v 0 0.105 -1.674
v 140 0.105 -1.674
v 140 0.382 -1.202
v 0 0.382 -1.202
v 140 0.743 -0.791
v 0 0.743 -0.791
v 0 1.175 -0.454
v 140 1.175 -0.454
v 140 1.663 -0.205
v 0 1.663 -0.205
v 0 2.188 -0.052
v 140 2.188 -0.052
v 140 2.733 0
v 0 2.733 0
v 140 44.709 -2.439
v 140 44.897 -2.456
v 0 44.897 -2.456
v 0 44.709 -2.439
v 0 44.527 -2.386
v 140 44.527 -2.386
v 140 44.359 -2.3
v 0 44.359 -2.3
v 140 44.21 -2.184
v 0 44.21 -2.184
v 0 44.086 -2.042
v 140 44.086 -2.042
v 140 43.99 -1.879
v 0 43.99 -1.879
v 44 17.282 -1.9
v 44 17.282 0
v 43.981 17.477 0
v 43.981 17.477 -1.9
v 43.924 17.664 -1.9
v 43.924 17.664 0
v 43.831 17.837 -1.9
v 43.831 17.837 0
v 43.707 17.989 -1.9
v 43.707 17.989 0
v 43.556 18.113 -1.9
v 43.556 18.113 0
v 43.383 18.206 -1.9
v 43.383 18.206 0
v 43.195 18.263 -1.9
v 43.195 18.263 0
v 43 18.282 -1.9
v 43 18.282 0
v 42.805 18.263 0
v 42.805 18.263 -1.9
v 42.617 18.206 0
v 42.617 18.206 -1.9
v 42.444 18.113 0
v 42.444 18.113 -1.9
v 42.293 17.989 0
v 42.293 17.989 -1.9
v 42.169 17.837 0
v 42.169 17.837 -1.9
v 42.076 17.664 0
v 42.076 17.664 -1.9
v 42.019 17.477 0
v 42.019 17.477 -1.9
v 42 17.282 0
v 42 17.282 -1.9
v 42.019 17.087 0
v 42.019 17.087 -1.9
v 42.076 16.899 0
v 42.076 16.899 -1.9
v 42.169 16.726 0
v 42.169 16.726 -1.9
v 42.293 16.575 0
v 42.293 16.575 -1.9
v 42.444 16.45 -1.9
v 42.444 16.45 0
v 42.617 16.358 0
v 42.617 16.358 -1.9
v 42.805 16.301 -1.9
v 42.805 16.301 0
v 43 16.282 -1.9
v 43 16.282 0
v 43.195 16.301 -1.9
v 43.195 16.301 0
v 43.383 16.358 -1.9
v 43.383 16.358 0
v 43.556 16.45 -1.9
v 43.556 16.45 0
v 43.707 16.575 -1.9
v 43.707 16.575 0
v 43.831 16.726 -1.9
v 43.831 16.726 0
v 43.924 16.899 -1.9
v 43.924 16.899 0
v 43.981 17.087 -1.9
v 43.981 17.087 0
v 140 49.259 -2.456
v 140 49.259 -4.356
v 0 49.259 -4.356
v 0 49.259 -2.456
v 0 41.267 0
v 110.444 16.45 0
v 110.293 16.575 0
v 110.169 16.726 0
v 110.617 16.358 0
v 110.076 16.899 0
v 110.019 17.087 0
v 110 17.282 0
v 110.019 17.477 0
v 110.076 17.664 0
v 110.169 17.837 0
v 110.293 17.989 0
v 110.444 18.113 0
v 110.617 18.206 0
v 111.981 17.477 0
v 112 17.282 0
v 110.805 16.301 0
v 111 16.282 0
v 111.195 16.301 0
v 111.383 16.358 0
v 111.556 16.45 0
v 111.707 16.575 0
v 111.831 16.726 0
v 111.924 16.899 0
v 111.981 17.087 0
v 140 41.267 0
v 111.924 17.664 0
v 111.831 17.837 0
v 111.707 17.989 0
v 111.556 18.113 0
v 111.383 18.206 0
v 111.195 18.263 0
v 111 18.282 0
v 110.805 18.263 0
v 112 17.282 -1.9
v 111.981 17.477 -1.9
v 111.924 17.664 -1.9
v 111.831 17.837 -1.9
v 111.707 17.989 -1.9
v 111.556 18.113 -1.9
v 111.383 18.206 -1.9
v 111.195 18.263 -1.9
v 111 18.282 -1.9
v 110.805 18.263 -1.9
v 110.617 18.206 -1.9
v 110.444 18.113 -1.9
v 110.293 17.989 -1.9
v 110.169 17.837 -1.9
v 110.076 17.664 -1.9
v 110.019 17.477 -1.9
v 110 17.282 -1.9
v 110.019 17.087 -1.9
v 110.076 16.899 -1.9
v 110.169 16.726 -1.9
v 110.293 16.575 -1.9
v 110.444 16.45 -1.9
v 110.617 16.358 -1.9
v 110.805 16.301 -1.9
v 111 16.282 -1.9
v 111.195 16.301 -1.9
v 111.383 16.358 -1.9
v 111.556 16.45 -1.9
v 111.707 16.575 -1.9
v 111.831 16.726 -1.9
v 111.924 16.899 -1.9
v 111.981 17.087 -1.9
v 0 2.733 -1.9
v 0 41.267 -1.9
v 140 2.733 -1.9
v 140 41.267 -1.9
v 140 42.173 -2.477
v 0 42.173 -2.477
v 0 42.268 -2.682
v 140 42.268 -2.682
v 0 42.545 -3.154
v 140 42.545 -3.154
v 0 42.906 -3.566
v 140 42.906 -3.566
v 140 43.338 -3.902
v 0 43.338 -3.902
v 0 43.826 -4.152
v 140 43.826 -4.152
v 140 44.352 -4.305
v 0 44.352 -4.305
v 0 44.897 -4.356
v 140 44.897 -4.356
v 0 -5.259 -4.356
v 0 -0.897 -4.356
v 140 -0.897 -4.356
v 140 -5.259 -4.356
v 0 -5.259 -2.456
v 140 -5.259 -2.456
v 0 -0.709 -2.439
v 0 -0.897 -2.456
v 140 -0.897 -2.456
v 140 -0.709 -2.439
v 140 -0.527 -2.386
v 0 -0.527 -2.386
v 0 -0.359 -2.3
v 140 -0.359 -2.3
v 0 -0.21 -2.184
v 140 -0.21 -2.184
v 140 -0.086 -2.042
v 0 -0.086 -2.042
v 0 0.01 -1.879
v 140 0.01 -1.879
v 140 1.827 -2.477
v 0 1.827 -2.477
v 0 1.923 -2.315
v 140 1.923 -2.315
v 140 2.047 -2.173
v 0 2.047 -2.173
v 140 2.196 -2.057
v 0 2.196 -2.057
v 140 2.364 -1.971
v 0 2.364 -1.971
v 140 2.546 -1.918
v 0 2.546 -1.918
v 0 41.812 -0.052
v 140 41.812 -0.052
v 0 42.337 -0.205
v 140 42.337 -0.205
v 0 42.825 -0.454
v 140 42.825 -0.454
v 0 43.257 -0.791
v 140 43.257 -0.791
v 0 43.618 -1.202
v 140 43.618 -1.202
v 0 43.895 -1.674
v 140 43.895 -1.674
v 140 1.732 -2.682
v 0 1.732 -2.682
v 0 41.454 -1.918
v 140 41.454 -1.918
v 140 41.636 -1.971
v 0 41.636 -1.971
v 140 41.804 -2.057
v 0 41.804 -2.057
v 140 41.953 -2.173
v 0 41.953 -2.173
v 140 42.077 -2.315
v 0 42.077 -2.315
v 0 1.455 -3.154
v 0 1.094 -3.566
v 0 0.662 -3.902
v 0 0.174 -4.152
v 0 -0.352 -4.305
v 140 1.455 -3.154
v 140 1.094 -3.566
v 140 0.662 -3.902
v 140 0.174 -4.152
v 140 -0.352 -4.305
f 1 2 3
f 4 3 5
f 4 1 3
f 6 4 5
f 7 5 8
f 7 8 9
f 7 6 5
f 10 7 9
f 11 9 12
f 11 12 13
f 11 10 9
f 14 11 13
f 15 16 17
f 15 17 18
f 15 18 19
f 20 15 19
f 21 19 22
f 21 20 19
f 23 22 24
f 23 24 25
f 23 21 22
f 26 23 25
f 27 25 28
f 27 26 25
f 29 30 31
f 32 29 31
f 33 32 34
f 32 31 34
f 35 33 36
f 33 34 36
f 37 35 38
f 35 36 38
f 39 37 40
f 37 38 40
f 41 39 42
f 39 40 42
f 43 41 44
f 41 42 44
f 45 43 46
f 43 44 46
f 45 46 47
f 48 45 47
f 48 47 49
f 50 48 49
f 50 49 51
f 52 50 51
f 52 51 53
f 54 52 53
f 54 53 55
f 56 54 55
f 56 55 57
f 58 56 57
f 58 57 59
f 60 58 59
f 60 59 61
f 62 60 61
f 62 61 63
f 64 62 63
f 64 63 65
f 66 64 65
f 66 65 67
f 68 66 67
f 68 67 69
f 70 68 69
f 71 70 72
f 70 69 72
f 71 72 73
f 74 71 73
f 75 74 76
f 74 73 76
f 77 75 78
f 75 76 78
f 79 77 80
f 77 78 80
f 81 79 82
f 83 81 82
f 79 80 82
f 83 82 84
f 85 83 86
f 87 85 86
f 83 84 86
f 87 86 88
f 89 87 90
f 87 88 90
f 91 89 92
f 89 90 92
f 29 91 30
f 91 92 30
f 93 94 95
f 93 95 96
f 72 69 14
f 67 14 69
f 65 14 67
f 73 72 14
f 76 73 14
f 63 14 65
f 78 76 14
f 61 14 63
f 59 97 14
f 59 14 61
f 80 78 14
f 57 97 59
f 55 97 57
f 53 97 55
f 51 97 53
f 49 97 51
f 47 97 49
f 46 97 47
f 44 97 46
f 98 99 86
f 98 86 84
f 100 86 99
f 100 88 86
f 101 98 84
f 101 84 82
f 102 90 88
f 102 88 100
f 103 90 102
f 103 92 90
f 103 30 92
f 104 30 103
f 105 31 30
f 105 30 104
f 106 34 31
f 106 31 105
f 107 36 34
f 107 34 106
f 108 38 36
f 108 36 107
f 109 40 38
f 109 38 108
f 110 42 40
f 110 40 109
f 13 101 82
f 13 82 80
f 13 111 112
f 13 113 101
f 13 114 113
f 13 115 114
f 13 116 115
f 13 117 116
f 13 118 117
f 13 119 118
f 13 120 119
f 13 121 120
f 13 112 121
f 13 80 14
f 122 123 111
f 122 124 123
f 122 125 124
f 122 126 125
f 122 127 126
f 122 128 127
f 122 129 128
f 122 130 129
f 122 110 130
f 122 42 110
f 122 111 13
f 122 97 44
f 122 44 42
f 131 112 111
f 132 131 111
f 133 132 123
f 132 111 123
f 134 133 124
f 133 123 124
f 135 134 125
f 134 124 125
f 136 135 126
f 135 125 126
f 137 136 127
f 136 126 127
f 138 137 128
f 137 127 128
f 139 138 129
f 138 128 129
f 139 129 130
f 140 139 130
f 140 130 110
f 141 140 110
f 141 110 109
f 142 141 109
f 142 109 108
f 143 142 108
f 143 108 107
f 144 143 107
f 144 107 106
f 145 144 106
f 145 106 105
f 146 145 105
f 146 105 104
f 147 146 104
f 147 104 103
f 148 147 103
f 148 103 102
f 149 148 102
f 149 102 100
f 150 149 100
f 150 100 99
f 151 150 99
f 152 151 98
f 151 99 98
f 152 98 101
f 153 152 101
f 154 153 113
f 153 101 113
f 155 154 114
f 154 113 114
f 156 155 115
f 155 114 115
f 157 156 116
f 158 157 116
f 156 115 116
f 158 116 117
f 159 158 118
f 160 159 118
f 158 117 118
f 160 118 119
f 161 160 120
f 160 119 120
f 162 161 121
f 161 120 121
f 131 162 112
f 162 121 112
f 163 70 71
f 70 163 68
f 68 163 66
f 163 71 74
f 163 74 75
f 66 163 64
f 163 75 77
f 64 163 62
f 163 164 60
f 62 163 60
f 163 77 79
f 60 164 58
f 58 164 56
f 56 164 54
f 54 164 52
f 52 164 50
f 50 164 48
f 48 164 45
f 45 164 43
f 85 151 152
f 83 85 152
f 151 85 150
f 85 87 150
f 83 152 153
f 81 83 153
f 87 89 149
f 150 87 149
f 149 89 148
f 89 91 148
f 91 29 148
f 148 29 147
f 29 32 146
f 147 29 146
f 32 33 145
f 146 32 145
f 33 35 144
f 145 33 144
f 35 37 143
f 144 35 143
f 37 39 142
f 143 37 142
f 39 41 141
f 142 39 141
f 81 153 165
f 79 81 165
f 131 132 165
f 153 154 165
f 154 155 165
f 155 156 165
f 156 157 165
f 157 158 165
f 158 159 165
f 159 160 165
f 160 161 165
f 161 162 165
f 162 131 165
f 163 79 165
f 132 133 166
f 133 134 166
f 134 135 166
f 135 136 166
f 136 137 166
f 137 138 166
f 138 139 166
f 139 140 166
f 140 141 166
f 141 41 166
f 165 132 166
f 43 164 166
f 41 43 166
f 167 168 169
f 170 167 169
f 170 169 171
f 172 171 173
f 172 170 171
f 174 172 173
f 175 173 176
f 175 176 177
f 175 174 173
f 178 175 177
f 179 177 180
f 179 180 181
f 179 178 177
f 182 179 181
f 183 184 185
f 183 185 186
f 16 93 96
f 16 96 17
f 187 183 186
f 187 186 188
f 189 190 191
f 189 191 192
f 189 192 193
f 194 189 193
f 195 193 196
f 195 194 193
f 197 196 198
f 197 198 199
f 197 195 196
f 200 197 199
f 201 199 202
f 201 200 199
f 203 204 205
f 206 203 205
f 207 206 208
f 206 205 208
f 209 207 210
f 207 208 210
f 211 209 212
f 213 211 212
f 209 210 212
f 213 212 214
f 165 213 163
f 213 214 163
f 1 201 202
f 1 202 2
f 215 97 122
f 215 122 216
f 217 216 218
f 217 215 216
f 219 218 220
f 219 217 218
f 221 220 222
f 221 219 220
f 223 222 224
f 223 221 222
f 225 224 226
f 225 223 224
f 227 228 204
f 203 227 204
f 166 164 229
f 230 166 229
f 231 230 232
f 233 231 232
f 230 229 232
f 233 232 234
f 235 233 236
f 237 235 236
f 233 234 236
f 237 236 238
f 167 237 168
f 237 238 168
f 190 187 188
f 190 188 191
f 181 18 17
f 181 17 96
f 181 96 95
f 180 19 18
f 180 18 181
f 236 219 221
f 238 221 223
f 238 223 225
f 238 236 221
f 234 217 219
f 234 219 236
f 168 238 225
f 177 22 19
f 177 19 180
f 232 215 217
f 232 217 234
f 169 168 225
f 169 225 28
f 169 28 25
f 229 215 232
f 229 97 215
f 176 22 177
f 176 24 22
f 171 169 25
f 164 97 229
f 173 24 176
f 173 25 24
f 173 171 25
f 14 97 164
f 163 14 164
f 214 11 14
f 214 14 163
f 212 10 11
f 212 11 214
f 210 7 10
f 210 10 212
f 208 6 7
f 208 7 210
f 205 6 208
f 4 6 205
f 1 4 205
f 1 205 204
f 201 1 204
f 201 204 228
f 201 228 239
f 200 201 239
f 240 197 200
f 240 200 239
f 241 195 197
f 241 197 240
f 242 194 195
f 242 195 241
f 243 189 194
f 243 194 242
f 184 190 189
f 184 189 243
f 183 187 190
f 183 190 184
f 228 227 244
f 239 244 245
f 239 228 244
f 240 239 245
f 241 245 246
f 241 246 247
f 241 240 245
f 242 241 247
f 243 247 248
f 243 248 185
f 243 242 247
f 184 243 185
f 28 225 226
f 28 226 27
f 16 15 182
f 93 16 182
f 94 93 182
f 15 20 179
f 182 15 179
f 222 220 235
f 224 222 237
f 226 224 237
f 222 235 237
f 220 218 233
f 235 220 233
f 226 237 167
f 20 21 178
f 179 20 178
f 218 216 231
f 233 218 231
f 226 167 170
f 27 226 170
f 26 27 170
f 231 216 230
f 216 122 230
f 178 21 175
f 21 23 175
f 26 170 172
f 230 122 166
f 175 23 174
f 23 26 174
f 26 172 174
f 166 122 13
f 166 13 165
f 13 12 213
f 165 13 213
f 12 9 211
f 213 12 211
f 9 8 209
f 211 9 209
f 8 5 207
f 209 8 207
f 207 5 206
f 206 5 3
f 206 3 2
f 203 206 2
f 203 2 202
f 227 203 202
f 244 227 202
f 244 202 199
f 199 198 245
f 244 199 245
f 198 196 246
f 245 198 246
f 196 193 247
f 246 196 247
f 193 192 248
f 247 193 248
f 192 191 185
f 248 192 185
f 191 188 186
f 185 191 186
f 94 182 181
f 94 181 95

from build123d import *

# Parameters (mm, degrees)
SKETCH1_W                      = 140
SKETCH1_H                      = 44
BASE_FLANGE1_DEPTH             = 1.9
EDGE_FLANGE1_DEPTH             = 140
EDGE_FLANGE1_2_DEPTH           = 140
EDGE_FLANGE2_STRIP_CUT_DEPTH   = 140
EDGE_FLANGE2_STRIP_CUT_2_DEPTH = 140
EDGE_FLANGE2_DEPTH             = 140
EDGE_FLANGE2_BEND_DEPTH        = 140
SKETCH40_R                     = 1
CUT_EXTRUDE1_DEPTH             = 5


# Read off the part's stored shape, not the designer's step: Edge-Flange1
# Sheet-metal steps are written as plain solids
with BuildPart() as part:
    # Sketch1 → Base-Flange1 (new body)
    with BuildSketch(Plane.XY):
        with Locations((70, 22)):
            Rectangle(SKETCH1_W, SKETCH1_H)
    extrude(amount=-BASE_FLANGE1_DEPTH)

    # Edge-Flange1 outline → Edge-Flange1 (cut)
    with BuildSketch(Plane.YZ):
        with BuildLine():
            ThreePointArc((41.266511693, 0), (42.824680557, -0.454164807), (43.894804276, -1.674407041))
            Line((43.894804276, -1.674407041), (44, -1.9))
            Line((44, -1.9), (44, 0))
            Line((44, 0), (41.266511693, 0))
        make_face()
        with BuildLine():
            ThreePointArc((0.105195724, -1.674407041), (1.175319443, -0.454164807), (2.733488307, 0))
            Line((2.733488307, 0), (0, 0))
            Line((0, 0), (0, -1.9))
            Line((0, -1.9), (0.105195724, -1.674407041))
        make_face()
    extrude(amount=EDGE_FLANGE1_DEPTH, mode=Mode.SUBTRACT)

    # Edge-Flange1 2 outline → Edge-Flange1 2 (add)
    with BuildSketch(Plane.YZ):
        with BuildLine():
            Line((44.259494142, -2.456486983), (44, -1.9))
            Line((44, -1.9), (41.266511693, -1.9))
            ThreePointArc((41.266511693, -1.9), (41.803811302, -2.056608554), (42.17281948, -2.477381738))
            Line((42.17281948, -2.477381738), (42.537509347, -3.259461681))
            Line((42.537509347, -3.259461681), (44.259494142, -2.456486983))
        make_face()
        with BuildLine():
            ThreePointArc((1.82718052, -2.477381738), (2.196188698, -2.056608554), (2.733488307, -1.9))
            Line((2.733488307, -1.9), (0, -1.9))
            Line((0, -1.9), (-0.259494142, -2.456486983))
            Line((-0.259494142, -2.456486983), (1.462490653, -3.259461681))
            Line((1.462490653, -3.259461681), (1.82718052, -2.477381738))
        make_face()
    extrude(amount=EDGE_FLANGE1_2_DEPTH)

    # Edge-Flange2 strip (across the edge) → Edge-Flange2 strip cut (cut)
    with BuildSketch(Plane(origin=(140, 44.259494142, -2.456486983), x_dir=(0, 0, 1), z_dir=(-1, 0, 0))):
        Polygon((-8.926147715, 2.065912991), (-0.225592959, -1.991222322), (0.577381738, -0.269237526), (-8.123173017, 3.787897786), align=None)
    extrude(amount=EDGE_FLANGE2_STRIP_CUT_DEPTH, mode=Mode.SUBTRACT)

    # Edge-Flange2 strip 2 (across the edge) → Edge-Flange2 strip cut 2 (cut)
    with BuildSketch(Plane(origin=(0, -0.259494142, -2.456486983), x_dir=(0, 0, 1), z_dir=(1, 0, 0))):
        Polygon((-8.926147715, 2.065912991), (-0.225592959, -1.991222322), (0.577381738, -0.269237526), (-8.123173017, 3.787897786), align=None)
    extrude(amount=EDGE_FLANGE2_STRIP_CUT_2_DEPTH, mode=Mode.SUBTRACT)

    # Edge-Flange2 section (across the edge) → Edge-Flange2 (add)
    with BuildSketch(Plane(origin=(140, 44.259494142, -2.456486983), x_dir=(0, 0, 1), z_dir=(-1, 0, 0))):
        with BuildLine():
            Line((-1.9, 0.637070261), (-1.9, 5))
            Line((-1.9, 5), (0, 5))
            Line((0, 5), (0, 0.637070261))
            ThreePointArc((0, 0.637070261), (0.156608554, 0.099770652), (0.577381738, -0.269237526))
            Line((0.577381738, -0.269237526), (-0.225592959, -1.991222322))
            ThreePointArc((-0.225592959, -1.991222322), (-1.445835193, -0.921098603), (-1.9, 0.637070261))
        make_face()
    extrude(amount=EDGE_FLANGE2_DEPTH)

    # Edge-Flange2 section 2 (across the edge) → Edge-Flange2 bend (add)
    with BuildSketch(Plane(origin=(0, -0.259494142, -2.456486983), x_dir=(0, 0, 1), z_dir=(1, 0, 0))):
        with BuildLine():
            Line((-1.9, 0.637070261), (-1.9, 5))
            Line((-1.9, 5), (0, 5))
            Line((0, 5), (0, 0.637070261))
            ThreePointArc((0, 0.637070261), (0.156608554, 0.099770652), (0.577381738, -0.269237526))
            Line((0.577381738, -0.269237526), (-0.225592959, -1.991222322))
            ThreePointArc((-0.225592959, -1.991222322), (-1.445835193, -0.921098603), (-1.9, 0.637070261))
        make_face()
    extrude(amount=EDGE_FLANGE2_BEND_DEPTH)

    # Sketch40 → Cut-Extrude1 (cut)
    with BuildSketch(Plane.XY):
        with Locations((111, 17.28174)):
            Circle(SKETCH40_R)
        with Locations((43, 17.28174)):
            Circle(SKETCH40_R)
    extrude(amount=-CUT_EXTRUDE1_DEPTH, mode=Mode.SUBTRACT)


solid = part.part
